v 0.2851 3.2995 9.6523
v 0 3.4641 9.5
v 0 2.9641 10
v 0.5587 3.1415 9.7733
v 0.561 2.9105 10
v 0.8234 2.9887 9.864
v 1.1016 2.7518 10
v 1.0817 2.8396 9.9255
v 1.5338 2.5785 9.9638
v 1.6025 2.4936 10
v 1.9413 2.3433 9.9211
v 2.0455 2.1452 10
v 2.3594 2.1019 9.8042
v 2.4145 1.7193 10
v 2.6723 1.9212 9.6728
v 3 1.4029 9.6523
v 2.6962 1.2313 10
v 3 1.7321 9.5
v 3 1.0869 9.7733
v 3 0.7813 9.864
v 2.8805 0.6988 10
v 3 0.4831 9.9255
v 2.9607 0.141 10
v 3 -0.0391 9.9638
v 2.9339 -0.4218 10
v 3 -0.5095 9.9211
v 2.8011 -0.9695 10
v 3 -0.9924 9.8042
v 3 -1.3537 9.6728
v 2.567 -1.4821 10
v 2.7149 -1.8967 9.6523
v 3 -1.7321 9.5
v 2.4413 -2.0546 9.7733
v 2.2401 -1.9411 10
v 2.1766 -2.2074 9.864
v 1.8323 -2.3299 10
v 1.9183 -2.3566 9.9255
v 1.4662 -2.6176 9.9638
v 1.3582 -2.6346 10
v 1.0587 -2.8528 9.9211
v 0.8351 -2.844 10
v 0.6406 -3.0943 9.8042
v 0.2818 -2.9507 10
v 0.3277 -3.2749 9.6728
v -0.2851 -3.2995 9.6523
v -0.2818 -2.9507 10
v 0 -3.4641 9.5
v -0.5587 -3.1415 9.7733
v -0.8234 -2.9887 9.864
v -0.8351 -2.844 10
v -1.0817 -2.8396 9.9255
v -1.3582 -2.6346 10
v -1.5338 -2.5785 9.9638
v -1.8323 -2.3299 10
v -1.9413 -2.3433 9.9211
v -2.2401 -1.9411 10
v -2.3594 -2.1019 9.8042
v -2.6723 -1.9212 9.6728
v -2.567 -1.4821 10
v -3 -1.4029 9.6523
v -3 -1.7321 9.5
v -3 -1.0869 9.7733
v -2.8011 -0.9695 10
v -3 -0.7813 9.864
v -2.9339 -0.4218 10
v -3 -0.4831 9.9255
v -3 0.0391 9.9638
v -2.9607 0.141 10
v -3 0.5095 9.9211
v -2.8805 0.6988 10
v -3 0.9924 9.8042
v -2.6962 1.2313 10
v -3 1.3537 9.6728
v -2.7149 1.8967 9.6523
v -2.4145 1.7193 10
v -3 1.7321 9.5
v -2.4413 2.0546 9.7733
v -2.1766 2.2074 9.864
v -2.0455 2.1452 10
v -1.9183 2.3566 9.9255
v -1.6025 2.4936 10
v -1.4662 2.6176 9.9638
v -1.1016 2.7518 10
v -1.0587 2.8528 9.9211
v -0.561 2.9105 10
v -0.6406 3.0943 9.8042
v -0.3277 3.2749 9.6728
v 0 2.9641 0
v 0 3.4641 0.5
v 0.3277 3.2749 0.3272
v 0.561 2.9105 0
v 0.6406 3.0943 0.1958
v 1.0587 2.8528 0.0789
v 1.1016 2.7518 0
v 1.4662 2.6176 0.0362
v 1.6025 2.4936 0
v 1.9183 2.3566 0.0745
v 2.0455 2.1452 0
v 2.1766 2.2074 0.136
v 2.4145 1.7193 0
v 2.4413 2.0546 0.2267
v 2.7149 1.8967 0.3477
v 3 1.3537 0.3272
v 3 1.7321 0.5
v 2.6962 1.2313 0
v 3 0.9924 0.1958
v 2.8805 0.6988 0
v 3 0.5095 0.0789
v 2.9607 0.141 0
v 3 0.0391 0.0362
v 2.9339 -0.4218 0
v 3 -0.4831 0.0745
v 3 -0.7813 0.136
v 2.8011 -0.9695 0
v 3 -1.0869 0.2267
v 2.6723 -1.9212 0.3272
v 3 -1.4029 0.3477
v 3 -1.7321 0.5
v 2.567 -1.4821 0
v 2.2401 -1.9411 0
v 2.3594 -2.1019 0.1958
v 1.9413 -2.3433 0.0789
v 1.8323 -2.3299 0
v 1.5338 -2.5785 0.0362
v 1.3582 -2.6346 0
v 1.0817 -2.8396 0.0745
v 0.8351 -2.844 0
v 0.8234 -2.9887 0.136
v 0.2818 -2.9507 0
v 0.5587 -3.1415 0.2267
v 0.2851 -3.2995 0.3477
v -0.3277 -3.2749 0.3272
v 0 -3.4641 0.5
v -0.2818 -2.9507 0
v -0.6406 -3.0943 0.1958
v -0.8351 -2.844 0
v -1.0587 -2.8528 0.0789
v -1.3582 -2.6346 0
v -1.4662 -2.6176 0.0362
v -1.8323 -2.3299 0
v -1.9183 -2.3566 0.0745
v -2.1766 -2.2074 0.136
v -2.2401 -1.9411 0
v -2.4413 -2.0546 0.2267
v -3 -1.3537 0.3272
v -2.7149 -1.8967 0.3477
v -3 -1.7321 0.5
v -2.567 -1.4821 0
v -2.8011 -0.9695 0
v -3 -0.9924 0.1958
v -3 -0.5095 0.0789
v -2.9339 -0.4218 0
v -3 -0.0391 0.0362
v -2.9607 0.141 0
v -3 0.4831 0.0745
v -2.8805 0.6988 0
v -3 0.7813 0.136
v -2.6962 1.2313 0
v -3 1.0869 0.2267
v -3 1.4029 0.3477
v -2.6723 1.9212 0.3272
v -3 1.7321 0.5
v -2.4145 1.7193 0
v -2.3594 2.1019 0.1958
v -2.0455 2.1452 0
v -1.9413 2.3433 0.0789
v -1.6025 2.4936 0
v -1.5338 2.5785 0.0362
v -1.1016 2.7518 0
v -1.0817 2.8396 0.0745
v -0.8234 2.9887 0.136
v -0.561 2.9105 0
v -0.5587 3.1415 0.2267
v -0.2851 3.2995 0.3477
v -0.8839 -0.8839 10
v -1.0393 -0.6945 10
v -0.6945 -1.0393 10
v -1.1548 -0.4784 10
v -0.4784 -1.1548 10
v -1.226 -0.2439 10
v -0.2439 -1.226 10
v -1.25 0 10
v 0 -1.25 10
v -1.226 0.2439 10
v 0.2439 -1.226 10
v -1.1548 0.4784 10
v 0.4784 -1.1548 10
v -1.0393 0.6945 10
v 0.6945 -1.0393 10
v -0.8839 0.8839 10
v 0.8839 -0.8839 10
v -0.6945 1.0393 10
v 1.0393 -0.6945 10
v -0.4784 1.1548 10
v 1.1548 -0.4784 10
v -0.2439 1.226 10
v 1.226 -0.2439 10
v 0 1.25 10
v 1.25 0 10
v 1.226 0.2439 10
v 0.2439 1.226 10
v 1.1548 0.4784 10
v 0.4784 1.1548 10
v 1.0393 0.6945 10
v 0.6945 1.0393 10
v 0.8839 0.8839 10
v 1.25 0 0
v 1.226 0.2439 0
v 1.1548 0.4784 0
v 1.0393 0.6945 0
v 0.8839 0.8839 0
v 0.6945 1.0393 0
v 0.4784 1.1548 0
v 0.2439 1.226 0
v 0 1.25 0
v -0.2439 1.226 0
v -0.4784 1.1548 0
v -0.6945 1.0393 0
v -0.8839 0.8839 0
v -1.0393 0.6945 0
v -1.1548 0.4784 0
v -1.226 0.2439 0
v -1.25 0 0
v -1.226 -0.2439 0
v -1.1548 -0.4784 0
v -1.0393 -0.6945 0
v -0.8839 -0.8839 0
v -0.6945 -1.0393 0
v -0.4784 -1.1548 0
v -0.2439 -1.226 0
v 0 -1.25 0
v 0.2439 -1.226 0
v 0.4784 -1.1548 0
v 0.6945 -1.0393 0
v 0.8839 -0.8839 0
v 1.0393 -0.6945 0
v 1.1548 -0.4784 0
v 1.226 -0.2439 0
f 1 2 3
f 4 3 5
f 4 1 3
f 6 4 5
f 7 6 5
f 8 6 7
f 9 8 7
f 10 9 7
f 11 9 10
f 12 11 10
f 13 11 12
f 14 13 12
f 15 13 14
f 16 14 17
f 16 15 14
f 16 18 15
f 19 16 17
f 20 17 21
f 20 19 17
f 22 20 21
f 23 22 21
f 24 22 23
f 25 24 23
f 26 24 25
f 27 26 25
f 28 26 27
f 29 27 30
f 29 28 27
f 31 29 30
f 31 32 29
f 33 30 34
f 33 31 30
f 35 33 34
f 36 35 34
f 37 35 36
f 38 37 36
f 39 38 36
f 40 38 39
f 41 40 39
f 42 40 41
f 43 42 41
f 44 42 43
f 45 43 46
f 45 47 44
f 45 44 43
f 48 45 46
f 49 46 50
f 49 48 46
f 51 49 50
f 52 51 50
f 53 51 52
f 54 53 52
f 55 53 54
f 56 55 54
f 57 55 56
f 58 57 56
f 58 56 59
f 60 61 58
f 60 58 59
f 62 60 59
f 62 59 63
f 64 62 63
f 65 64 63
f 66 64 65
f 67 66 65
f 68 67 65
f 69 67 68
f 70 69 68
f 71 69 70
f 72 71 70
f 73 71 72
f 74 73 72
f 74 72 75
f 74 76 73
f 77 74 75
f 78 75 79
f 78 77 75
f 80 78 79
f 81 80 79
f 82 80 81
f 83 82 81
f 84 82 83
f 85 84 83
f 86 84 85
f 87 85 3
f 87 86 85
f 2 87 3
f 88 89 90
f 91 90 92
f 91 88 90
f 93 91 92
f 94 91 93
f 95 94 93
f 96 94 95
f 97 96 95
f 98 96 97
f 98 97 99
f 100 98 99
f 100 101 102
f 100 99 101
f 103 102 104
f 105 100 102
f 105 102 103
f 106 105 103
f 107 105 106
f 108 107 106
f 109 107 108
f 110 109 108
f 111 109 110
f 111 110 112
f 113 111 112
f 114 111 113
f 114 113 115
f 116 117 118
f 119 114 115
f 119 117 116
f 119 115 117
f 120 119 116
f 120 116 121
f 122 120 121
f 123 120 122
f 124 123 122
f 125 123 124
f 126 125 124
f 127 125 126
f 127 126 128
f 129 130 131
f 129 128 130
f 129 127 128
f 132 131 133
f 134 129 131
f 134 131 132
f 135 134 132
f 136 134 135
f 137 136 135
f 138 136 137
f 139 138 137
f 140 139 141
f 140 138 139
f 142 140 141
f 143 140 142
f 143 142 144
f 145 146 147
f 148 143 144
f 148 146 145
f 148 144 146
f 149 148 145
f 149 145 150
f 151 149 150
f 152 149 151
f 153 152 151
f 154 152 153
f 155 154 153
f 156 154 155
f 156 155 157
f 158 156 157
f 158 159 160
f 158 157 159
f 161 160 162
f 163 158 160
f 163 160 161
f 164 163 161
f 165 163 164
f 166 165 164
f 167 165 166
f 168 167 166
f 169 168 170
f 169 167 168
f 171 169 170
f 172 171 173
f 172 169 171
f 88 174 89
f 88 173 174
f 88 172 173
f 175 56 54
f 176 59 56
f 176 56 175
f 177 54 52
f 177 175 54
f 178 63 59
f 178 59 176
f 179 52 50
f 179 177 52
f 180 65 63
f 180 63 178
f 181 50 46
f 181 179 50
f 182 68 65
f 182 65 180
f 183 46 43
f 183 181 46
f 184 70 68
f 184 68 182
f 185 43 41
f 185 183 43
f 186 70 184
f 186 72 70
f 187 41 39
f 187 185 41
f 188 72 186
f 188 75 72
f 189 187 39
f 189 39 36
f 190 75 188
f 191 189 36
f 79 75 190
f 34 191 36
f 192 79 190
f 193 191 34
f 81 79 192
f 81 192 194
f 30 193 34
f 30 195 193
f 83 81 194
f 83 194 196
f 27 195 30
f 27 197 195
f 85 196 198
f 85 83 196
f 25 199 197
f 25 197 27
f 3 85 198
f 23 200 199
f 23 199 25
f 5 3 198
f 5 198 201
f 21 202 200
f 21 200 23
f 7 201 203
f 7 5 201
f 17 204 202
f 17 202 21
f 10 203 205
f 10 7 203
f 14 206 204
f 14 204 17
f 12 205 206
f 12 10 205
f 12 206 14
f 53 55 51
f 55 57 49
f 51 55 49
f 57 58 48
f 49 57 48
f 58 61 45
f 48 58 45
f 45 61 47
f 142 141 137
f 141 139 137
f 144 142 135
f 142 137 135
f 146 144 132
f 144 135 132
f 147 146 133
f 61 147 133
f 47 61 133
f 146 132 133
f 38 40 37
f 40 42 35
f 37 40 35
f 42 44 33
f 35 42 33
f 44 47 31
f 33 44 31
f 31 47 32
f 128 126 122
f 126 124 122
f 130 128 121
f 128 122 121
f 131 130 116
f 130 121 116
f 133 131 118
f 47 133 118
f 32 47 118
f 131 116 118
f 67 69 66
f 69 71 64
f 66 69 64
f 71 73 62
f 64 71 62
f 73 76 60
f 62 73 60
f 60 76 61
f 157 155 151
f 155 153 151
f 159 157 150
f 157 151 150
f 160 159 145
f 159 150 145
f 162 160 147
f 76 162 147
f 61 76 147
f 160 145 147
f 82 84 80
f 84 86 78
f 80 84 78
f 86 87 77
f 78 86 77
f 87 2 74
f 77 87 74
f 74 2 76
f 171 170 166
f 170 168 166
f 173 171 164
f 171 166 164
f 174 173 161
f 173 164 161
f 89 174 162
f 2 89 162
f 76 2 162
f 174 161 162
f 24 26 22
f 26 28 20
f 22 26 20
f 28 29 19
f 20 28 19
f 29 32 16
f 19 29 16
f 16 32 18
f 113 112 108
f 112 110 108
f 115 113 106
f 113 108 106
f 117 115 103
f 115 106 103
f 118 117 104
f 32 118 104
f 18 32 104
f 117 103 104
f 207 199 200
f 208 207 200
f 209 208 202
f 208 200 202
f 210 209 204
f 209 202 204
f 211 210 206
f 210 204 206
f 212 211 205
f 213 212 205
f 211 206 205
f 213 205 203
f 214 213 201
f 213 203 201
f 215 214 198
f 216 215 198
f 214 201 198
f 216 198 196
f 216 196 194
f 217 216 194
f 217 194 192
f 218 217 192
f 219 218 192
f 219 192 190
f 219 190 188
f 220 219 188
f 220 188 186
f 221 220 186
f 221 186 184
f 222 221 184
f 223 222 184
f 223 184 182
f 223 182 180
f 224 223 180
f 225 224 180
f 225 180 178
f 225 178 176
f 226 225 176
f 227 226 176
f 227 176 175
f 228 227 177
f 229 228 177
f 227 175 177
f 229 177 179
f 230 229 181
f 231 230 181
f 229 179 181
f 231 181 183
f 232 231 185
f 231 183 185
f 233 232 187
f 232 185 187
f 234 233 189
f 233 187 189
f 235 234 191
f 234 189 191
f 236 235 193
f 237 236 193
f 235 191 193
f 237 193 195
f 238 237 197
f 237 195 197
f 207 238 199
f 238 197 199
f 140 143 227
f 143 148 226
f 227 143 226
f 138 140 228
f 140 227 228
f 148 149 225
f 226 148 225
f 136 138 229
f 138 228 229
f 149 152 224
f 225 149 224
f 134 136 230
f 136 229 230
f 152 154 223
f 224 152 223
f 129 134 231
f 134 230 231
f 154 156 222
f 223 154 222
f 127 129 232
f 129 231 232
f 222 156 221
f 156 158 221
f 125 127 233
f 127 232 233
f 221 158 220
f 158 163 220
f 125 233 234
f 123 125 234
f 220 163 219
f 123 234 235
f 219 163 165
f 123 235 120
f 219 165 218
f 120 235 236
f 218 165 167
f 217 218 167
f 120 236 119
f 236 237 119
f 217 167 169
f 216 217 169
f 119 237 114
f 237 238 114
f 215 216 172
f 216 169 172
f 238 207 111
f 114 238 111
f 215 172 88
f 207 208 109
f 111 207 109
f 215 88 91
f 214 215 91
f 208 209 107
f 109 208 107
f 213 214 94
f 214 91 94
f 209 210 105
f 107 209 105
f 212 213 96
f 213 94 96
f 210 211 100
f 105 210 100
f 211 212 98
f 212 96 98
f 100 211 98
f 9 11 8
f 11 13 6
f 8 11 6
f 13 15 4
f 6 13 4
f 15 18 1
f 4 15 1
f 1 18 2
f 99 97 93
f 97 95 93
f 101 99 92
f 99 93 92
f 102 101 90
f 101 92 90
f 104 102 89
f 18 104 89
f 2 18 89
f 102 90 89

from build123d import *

# Parameters (mm, degrees)
BOSS_EXTRU_1_DEPTH                        = 10
TROU_POUR_TARAUDAGE_POUR_TROU_TARAUD_M3_D = 2.5


with BuildPart() as part:
    # Esquisse1 → Boss.-Extru.1 (new body)
    with BuildSketch(Plane.XY):
        Polygon((0, 3.464101615), (-3, 1.732050808), (-3, -1.732050808), (0, -3.464101615), (3, -1.732050808), (3, 1.732050808), align=None)
    extrude(amount=BOSS_EXTRU_1_DEPTH)

    # Esquisse2 → Enlèvement de matière-Révolution1 (revolve, cut)
    with BuildSketch(Plane(origin=(0, 0, 0), x_dir=(0, 0, -1), z_dir=(1, 0, 0))):
        Polygon((-10, 2.964101615), (-9.5, 3.464101615), (-9.5, 7.964101615), (-14.5, 7.964101615), (-14.5, 2.964101615), align=None)
        Polygon((0, 2.964101615), (4.5, 2.964101615), (4.5, 7.964101615), (-0.5, 7.964101615), (-0.5, 3.464101615), align=None)
    revolve(axis=Axis((0, 0, 1000), (0, 0, -1)), mode=Mode.SUBTRACT)

    # Trou pour taraudage pour trou taraudé M31 (through all)
    with Locations(Plane(origin=(0, 0, 0), x_dir=(-1, 0, 0), z_dir=(0, 0, -1))):
        with Locations((0, 0)):
            Hole(TROU_POUR_TARAUDAGE_POUR_TROU_TARAUD_M3_D / 2)


solid = part.part
